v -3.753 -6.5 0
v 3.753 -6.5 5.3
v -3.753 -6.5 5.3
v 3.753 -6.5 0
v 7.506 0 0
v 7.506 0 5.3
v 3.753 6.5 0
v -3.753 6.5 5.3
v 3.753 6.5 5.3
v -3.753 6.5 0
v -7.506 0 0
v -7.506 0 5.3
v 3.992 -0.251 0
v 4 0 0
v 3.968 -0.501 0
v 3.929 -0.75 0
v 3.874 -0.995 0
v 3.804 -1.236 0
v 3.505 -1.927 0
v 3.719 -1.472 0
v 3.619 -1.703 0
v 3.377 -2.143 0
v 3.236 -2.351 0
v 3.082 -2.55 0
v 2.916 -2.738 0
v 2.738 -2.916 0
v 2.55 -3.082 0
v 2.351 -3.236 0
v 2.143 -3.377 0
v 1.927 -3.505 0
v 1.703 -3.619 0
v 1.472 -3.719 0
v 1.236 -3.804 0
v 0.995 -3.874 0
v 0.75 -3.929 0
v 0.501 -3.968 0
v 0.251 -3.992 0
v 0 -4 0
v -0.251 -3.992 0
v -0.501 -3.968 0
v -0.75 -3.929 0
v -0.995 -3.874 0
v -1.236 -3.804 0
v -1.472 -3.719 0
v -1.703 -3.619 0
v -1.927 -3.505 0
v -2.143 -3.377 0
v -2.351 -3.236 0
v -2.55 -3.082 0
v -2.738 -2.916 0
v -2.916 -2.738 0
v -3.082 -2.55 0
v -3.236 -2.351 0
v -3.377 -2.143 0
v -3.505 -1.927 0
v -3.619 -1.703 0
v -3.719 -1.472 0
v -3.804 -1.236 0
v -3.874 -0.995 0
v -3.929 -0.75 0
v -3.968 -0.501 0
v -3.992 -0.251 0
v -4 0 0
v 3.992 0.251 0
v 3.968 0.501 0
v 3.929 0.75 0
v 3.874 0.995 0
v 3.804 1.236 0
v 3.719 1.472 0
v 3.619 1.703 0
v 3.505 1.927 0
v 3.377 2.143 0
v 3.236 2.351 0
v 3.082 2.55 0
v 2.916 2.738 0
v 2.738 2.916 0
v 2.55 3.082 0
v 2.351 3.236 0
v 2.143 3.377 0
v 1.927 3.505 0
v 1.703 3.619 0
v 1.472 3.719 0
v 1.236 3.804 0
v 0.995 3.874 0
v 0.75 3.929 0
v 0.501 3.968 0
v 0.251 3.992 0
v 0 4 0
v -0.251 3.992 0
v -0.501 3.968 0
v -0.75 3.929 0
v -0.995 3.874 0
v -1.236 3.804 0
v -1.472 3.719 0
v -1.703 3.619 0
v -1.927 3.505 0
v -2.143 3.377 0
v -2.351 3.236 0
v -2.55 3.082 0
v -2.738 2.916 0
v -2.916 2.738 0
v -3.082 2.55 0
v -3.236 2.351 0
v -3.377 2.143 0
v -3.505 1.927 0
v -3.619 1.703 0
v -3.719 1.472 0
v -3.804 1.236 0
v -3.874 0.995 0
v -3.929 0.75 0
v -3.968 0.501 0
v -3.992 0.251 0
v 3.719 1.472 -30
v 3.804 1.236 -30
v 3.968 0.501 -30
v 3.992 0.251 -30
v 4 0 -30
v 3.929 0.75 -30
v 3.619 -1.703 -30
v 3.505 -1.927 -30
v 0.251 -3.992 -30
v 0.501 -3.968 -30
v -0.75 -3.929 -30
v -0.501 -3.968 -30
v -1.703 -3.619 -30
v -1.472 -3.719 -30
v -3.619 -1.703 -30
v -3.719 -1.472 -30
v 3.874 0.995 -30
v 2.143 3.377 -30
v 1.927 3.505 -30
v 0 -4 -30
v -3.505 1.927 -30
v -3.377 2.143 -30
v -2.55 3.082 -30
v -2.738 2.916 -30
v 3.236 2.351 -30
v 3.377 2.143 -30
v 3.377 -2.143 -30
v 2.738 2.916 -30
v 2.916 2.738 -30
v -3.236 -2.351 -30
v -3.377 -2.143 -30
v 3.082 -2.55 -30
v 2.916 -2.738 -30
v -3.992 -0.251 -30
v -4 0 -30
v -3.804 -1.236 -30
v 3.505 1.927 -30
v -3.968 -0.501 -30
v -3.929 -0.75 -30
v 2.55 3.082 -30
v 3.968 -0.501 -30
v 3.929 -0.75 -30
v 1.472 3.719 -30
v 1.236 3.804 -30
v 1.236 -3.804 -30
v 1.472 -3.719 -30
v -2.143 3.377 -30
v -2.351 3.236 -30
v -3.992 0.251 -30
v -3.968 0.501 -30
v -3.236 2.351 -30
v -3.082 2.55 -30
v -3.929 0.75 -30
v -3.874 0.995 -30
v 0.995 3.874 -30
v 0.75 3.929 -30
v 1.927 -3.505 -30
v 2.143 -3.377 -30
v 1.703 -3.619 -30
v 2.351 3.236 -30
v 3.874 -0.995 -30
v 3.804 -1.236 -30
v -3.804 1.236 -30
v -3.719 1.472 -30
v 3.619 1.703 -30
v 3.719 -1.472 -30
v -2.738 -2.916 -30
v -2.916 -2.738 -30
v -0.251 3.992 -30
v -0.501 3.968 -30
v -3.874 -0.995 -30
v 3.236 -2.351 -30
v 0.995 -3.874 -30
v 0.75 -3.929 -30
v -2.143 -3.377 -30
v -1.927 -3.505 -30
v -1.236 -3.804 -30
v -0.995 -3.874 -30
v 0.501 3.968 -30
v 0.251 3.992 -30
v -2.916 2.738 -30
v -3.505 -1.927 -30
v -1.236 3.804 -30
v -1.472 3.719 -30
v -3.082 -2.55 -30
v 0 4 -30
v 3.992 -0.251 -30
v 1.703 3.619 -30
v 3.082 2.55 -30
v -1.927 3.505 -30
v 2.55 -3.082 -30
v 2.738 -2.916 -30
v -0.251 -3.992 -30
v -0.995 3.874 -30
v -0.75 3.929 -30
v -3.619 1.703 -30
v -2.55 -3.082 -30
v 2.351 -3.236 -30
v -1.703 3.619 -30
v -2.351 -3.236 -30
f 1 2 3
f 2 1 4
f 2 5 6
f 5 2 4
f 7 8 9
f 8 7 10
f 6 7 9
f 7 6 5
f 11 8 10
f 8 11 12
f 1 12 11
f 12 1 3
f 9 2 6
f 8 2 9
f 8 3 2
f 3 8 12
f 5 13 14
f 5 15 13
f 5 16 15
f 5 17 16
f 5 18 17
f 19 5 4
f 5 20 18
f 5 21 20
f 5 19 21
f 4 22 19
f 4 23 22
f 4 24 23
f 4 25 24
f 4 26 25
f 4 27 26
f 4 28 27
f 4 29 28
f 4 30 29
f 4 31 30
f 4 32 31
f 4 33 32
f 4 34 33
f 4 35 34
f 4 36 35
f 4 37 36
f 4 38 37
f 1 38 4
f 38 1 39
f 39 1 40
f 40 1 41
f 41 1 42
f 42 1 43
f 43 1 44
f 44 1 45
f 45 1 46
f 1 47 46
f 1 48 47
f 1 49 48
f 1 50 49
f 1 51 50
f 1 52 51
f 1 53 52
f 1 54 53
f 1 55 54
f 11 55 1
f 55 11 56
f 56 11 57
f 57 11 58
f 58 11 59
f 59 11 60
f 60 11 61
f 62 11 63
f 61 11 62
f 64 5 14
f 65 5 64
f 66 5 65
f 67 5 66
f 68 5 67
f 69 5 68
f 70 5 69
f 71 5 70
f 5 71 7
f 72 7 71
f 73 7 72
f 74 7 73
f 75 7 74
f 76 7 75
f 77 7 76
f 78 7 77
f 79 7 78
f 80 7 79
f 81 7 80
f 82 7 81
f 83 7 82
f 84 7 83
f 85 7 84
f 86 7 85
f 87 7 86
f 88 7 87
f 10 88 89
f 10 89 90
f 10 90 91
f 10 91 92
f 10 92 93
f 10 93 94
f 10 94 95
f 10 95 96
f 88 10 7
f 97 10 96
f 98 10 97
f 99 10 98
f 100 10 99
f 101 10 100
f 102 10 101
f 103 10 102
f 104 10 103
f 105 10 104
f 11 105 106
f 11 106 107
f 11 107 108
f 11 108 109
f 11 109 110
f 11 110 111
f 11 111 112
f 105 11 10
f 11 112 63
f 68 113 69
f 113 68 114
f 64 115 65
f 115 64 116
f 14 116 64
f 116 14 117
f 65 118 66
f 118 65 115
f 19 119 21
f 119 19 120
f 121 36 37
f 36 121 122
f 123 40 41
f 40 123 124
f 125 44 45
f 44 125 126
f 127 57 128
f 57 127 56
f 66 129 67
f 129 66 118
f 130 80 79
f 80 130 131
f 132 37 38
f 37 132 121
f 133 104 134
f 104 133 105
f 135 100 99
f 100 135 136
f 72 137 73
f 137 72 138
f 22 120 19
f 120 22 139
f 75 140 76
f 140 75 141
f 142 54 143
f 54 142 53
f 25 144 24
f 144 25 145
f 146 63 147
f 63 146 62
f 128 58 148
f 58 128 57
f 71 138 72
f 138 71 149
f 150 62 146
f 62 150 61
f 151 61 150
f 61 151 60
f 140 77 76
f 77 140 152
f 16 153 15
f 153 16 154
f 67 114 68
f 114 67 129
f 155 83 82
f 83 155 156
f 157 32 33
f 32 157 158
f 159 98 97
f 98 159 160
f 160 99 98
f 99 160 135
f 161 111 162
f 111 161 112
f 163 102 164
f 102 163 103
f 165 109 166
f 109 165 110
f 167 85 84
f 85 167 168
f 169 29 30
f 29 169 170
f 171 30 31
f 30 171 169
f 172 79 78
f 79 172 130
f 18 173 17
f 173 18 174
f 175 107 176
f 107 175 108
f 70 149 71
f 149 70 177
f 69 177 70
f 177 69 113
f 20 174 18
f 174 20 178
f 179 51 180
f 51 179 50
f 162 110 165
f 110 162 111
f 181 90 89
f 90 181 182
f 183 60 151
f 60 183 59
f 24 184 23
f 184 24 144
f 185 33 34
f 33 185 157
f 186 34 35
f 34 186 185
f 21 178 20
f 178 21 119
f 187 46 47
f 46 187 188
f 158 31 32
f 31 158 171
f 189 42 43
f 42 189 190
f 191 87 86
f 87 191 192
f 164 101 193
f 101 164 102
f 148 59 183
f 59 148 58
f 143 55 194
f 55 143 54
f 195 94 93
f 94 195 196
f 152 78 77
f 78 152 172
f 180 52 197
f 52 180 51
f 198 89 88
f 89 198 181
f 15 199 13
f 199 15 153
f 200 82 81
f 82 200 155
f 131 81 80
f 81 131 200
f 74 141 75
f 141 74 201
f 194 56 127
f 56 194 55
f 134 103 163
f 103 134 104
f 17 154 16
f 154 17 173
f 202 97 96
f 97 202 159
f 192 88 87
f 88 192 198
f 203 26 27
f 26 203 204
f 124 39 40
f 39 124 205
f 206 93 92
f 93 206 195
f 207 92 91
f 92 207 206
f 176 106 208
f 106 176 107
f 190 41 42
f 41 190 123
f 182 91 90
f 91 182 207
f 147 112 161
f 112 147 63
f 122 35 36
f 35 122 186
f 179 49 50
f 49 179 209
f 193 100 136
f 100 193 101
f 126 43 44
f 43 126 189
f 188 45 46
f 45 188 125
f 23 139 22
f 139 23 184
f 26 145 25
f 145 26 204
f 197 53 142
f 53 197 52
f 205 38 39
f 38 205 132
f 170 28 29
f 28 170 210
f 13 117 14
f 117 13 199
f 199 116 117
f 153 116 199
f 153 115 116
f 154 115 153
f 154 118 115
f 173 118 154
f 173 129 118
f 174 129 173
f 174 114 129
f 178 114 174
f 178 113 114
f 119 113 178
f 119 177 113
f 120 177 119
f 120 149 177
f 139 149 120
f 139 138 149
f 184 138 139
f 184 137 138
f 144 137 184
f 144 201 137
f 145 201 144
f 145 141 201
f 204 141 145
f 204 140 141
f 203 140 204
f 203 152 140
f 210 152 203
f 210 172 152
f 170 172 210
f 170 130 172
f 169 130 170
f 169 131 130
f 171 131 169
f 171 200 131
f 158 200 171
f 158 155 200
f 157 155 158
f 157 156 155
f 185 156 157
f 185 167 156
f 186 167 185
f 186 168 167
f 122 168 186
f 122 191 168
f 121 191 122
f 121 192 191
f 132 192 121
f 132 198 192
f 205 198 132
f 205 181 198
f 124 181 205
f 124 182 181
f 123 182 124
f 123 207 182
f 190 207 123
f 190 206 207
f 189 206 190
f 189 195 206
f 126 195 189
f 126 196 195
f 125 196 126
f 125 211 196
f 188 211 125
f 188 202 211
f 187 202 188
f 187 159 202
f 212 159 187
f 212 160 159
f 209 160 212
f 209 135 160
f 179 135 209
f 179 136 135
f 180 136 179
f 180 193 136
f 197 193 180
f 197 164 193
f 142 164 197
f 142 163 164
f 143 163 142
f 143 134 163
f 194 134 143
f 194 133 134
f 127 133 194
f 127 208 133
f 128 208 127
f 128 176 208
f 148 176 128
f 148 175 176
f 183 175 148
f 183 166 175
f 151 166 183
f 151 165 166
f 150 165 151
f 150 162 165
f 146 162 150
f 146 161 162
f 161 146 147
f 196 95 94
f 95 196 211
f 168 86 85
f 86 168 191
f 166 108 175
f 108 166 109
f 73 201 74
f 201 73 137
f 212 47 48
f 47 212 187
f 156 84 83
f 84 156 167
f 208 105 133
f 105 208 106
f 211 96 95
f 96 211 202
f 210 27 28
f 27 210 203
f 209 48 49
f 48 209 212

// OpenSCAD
// M8 六角ボルト

// 寸法パラメータ
across_flats = 13;    // 対辺距離 (mm)
head_height  = 5.3;   // 頭部高さ (mm)
shank_dia    = 8;     // シャンク直径 (mm)
shank_len    = 30;    // シャンク長さ (mm)

$fn = 100;

module hex_bolt() {
    // 頭部:六角柱(底面が z=0、上方向へ伸ばす)
    // 対辺距離から外接円半径を算出
    head_r = across_flats / sqrt(3);
    cylinder(h = head_height, r = head_r, $fn = 6);

    // シャンク:z<0 側へ伸ばす
    translate([0, 0, -shank_len])
        cylinder(h = shank_len, d = shank_dia);
}

hex_bolt();
